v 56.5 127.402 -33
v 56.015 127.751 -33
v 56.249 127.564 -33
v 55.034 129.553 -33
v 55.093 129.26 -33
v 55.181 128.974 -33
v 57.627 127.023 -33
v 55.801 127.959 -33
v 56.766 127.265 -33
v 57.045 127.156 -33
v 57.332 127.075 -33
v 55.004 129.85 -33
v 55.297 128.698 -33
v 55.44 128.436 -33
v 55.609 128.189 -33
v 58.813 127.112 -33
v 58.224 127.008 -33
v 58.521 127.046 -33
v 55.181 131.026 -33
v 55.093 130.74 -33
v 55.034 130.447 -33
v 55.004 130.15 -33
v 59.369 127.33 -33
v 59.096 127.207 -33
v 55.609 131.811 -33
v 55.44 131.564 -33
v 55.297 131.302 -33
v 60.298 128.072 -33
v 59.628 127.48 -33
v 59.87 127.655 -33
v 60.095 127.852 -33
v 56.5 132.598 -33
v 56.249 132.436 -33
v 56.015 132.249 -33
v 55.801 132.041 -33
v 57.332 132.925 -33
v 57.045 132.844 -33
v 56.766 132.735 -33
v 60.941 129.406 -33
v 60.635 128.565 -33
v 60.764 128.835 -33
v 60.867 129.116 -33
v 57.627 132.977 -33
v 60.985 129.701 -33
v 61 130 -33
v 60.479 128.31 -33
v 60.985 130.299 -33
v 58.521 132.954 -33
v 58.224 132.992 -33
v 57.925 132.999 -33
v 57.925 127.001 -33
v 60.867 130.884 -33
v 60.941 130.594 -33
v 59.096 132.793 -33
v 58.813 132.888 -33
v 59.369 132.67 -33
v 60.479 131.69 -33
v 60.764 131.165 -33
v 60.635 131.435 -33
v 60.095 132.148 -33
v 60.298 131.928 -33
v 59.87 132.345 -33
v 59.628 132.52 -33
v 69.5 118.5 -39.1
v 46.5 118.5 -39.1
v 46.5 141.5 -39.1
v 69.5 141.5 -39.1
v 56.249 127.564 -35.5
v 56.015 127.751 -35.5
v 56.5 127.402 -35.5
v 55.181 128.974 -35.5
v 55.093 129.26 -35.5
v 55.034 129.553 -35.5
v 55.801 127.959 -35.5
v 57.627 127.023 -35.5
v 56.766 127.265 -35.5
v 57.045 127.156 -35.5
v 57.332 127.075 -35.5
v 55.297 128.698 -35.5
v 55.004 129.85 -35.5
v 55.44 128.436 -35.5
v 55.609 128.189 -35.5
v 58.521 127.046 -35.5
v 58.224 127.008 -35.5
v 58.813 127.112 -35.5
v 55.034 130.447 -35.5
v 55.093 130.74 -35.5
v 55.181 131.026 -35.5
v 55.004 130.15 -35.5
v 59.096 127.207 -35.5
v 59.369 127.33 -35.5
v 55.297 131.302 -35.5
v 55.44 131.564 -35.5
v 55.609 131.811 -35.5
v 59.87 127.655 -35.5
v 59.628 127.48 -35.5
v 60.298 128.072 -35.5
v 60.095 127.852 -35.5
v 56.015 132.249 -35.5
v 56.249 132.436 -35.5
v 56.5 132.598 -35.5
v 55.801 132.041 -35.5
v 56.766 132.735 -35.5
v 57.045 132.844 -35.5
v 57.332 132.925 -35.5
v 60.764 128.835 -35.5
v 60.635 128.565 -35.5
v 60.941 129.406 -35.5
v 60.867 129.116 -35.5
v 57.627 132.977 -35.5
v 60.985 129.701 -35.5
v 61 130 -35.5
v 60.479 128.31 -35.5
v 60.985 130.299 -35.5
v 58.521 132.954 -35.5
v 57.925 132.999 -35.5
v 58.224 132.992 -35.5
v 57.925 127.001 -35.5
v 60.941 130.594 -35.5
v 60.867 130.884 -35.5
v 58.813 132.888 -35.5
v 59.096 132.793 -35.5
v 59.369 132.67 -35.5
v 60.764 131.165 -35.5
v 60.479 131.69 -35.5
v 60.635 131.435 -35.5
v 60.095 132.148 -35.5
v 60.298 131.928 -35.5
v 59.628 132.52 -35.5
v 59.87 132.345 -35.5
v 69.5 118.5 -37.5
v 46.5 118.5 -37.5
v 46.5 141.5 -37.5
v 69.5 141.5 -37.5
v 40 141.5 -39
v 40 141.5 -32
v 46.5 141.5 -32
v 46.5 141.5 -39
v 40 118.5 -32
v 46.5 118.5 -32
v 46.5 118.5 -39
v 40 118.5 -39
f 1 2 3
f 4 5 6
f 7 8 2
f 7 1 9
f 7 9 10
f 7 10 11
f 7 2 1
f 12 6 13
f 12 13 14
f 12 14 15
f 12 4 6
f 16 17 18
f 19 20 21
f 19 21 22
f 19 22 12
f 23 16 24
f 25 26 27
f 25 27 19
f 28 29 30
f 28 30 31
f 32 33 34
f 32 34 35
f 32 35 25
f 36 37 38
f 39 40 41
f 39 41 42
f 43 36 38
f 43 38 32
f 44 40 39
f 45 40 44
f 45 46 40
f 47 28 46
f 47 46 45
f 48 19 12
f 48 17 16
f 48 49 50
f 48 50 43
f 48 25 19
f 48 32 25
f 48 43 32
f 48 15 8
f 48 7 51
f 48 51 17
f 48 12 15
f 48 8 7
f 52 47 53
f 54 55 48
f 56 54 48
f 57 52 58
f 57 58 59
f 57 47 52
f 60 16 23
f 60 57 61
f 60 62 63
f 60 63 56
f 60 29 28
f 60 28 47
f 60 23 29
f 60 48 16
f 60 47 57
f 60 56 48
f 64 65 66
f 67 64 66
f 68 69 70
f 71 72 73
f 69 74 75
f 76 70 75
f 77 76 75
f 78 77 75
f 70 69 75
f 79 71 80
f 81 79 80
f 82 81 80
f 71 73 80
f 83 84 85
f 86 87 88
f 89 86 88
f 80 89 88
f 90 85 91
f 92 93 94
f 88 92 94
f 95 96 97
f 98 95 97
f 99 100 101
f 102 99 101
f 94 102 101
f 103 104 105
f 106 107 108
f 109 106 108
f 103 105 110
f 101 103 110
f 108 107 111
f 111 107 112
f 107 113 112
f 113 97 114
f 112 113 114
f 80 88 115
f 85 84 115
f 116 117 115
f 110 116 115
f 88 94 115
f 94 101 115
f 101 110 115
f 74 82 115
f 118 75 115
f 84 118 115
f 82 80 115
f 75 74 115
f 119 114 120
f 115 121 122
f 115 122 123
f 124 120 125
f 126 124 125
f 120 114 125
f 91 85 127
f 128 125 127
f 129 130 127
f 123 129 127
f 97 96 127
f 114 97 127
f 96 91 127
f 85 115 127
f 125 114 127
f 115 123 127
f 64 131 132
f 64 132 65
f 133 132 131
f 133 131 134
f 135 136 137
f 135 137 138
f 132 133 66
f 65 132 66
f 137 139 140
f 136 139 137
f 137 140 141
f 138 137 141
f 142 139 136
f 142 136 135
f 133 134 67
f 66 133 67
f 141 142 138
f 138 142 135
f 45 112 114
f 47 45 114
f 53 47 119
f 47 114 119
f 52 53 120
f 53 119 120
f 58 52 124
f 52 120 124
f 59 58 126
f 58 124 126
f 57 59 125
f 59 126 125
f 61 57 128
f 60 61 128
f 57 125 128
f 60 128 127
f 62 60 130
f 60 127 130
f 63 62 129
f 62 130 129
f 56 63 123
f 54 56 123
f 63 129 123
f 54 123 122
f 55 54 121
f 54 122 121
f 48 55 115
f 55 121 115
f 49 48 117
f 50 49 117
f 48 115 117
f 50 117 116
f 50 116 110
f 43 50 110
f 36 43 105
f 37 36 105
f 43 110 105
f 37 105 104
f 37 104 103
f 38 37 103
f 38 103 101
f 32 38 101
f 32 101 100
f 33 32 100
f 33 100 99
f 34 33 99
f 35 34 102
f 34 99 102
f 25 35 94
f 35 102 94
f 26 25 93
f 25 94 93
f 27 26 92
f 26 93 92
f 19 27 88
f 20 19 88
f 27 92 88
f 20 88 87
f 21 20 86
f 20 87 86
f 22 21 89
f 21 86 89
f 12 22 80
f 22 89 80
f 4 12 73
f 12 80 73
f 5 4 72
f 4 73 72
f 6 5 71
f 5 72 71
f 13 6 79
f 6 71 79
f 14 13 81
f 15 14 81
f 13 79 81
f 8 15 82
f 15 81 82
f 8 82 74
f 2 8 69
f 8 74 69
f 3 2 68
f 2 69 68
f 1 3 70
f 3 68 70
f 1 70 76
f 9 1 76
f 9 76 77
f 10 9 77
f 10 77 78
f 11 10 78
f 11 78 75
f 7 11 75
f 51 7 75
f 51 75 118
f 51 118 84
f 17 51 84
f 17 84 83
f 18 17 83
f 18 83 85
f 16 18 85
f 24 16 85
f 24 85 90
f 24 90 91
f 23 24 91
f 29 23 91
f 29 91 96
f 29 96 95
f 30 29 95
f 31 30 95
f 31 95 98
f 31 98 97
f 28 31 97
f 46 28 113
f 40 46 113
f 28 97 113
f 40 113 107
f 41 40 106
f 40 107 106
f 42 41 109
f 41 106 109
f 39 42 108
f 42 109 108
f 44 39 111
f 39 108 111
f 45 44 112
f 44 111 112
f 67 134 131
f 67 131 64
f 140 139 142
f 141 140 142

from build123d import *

# Parameters (mm, degrees)
MAGNET_START         = -35.5
SKETCH1_R            = 3
MAGNET_DEPTH         = 2.5
AS5600_BOARD_START   = 46.5
SKETCH2_W            = 1.6
SKETCH2_H            = 23
AS5600_BOARD_DEPTH   = 23
SENSOR_BRACKET_START = 40
SKETCH3_W            = 7
SKETCH3_H            = 23
SENSOR_BRACKET_DEPTH = 6.5


with BuildPart() as part:
    # Sketch1 → magnet (new body)
    with BuildSketch(Plane.XY.offset(MAGNET_START)):
        with Locations((58, 130)):
            Circle(SKETCH1_R)
    extrude(amount=MAGNET_DEPTH)


with BuildPart() as body_2:
    # Sketch2 → as5600_board (new body)
    with BuildSketch(Plane(origin=(0, 0, 0), x_dir=(0, 0, -1), z_dir=(1, 0, 0)).offset(AS5600_BOARD_START)):
        with Locations((38.3, 130)):
            Rectangle(SKETCH2_W, SKETCH2_H)
    extrude(amount=AS5600_BOARD_DEPTH)


with BuildPart() as body_3:
    # Sketch3 → sensor_bracket (new body)
    with BuildSketch(Plane(origin=(0, 0, 0), x_dir=(0, 0, -1), z_dir=(1, 0, 0)).offset(SENSOR_BRACKET_START)):
        with Locations((35.5, 130)):
            Rectangle(SKETCH3_W, SKETCH3_H)
    extrude(amount=SENSOR_BRACKET_DEPTH)


solid = Compound([part.part, body_2.part, body_3.part])
